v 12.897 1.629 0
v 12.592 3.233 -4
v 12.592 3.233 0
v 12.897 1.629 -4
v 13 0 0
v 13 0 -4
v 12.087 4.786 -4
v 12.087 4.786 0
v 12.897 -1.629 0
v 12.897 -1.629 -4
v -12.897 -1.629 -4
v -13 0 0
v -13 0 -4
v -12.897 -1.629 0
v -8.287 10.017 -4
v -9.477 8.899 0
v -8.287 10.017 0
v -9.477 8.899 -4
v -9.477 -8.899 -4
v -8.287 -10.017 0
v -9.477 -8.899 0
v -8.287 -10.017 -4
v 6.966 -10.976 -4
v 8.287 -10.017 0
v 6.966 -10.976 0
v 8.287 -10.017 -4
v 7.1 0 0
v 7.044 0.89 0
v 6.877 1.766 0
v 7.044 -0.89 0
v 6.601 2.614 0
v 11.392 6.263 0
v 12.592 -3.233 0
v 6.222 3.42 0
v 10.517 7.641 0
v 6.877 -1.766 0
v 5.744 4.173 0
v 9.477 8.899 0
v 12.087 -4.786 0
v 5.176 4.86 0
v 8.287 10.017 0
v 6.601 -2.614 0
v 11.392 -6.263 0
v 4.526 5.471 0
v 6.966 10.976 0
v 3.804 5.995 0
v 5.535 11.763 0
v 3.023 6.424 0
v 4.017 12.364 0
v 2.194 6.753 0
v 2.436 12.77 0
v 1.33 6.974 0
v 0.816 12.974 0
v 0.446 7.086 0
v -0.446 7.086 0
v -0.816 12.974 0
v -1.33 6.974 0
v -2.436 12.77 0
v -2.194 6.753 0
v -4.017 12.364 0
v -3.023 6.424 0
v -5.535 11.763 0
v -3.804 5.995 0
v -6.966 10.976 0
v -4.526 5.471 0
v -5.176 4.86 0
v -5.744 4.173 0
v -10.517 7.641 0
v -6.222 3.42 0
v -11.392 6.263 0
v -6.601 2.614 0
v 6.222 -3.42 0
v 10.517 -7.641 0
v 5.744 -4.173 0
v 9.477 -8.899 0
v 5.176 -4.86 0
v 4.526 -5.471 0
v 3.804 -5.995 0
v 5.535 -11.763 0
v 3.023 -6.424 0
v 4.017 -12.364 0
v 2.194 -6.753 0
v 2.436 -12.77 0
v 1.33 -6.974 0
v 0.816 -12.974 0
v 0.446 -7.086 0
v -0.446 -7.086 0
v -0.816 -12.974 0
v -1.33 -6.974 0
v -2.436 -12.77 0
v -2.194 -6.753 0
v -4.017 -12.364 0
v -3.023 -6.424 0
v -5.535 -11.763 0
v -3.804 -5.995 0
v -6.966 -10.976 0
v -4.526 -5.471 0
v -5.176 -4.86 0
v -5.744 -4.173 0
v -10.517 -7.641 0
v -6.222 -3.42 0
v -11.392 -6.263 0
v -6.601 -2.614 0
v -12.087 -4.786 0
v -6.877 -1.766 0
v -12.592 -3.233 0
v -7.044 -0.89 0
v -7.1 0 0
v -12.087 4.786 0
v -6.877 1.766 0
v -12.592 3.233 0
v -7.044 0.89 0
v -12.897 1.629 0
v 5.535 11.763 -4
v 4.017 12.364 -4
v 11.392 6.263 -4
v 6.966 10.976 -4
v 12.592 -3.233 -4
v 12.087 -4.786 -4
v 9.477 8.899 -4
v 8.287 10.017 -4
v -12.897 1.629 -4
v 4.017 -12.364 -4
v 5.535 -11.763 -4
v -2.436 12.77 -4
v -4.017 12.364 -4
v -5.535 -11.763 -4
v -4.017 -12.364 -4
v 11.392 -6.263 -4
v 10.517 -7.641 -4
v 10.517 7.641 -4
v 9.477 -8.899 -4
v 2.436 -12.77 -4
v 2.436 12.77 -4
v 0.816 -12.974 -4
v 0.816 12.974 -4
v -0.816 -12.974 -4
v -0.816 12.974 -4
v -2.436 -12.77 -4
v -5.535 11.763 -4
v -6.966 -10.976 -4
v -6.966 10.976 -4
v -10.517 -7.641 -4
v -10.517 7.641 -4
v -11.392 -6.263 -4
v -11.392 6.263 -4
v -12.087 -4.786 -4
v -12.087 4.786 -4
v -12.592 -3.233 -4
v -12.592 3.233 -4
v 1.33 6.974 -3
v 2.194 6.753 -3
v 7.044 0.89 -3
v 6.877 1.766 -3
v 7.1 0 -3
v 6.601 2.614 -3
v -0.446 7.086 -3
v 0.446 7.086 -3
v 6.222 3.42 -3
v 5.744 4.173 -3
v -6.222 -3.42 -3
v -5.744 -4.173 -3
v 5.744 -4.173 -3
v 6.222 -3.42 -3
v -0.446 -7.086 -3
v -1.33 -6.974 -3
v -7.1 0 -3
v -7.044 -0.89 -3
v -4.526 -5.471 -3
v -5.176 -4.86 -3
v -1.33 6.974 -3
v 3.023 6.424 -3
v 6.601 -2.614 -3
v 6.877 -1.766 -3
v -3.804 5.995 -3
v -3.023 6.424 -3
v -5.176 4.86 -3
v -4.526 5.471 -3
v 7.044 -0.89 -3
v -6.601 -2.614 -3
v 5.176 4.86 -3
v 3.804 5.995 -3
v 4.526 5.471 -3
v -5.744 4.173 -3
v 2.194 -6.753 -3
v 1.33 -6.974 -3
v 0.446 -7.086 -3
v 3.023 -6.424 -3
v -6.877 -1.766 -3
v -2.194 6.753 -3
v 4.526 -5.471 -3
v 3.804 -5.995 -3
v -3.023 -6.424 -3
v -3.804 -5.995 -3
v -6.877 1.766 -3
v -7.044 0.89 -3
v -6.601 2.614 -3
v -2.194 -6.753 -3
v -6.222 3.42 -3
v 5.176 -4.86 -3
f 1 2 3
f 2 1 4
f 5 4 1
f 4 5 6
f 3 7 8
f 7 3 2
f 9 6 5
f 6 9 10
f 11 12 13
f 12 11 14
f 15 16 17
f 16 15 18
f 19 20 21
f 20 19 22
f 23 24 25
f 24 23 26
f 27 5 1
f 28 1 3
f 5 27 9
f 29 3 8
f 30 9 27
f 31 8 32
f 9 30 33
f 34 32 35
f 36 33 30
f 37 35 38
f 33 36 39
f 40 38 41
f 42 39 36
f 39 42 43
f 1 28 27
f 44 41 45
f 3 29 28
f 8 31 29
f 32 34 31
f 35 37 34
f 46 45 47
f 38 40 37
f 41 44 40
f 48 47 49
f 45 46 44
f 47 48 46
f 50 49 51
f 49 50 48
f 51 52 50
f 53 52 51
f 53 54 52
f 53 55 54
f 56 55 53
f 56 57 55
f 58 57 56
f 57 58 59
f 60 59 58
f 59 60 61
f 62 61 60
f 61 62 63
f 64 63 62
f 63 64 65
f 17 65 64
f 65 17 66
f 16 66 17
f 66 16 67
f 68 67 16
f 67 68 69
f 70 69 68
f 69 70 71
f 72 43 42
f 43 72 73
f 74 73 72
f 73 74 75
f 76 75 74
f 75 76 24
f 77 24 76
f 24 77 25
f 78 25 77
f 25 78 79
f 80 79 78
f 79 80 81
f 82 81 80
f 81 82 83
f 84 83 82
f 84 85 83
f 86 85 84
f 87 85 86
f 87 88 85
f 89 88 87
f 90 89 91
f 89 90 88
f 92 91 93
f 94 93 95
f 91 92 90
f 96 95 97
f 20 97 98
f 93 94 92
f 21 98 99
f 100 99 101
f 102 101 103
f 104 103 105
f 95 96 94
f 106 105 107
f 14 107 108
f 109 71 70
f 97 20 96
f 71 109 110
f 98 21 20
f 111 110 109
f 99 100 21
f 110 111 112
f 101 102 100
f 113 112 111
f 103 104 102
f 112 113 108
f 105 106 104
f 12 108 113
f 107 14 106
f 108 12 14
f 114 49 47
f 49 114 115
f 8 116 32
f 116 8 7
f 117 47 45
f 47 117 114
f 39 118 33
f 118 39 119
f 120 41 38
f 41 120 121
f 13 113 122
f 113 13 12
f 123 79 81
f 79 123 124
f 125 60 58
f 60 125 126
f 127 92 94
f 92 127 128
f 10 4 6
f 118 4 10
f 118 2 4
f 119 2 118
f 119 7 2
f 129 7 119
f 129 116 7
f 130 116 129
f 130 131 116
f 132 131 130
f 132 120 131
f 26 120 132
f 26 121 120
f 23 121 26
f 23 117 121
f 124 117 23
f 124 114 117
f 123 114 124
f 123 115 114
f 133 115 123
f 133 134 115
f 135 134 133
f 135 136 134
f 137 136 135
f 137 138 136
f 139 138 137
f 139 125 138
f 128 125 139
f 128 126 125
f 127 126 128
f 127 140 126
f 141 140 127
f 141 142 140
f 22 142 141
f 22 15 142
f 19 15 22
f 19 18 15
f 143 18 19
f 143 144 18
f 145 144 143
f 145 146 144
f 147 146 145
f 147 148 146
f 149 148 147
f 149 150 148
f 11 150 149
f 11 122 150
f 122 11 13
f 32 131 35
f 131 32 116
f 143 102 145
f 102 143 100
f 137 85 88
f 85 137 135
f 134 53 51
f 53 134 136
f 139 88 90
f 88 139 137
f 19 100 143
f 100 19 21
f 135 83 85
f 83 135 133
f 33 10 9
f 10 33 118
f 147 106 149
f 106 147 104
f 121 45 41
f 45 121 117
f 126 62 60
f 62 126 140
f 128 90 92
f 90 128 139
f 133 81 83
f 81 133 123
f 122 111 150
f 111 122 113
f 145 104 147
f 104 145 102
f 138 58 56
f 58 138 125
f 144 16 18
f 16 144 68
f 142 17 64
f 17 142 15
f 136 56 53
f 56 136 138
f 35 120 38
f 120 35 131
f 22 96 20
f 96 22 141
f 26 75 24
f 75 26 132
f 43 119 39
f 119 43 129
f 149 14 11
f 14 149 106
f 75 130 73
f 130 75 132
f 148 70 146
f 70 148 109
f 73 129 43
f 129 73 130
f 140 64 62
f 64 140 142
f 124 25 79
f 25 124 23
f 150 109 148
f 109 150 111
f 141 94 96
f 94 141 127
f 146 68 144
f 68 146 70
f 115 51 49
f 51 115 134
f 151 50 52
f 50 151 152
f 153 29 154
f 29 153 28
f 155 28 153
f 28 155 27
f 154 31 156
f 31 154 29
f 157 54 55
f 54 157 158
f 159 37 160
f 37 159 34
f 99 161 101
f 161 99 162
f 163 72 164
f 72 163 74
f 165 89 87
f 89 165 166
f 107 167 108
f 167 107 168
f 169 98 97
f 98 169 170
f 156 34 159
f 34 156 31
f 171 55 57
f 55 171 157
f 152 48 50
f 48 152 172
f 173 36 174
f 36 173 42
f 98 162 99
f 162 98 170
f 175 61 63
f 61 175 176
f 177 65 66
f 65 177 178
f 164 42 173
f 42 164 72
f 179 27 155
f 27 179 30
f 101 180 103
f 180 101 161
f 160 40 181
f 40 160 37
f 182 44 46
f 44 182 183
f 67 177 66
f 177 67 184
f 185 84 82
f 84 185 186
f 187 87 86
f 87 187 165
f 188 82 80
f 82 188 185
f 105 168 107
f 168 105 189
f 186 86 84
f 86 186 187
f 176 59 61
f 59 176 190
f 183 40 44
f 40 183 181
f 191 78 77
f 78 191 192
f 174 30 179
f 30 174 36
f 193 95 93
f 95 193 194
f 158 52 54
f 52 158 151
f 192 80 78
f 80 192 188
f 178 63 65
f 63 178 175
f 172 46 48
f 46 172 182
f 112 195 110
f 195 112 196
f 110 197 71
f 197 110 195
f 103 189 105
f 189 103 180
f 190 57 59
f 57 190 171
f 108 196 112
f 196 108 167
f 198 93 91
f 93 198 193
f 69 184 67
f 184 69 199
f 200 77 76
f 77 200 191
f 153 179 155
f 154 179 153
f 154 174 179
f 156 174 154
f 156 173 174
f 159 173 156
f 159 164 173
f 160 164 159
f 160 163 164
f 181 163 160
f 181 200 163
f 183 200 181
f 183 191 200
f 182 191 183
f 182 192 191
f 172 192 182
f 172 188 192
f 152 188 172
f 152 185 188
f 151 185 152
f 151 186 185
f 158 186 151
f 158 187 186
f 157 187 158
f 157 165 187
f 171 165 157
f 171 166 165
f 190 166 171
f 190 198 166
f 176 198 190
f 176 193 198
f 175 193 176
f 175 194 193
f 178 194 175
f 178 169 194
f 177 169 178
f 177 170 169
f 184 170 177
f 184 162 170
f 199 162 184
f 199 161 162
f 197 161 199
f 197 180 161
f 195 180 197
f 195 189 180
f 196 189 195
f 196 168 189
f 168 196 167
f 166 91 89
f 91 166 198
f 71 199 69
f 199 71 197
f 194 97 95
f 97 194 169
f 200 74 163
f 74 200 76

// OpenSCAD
$fn = 50;


difference() {
	union() {
		translate(v = [0, 0, -4.0000000000]) {
			cylinder(h = 4, r = 13.0000000000);
		}
	}
	union() {
		#translate(v = [0, 0, -3.0000000000]) {
			cylinder(h = 3, r = 7.1000000000);
		}
	}
}
